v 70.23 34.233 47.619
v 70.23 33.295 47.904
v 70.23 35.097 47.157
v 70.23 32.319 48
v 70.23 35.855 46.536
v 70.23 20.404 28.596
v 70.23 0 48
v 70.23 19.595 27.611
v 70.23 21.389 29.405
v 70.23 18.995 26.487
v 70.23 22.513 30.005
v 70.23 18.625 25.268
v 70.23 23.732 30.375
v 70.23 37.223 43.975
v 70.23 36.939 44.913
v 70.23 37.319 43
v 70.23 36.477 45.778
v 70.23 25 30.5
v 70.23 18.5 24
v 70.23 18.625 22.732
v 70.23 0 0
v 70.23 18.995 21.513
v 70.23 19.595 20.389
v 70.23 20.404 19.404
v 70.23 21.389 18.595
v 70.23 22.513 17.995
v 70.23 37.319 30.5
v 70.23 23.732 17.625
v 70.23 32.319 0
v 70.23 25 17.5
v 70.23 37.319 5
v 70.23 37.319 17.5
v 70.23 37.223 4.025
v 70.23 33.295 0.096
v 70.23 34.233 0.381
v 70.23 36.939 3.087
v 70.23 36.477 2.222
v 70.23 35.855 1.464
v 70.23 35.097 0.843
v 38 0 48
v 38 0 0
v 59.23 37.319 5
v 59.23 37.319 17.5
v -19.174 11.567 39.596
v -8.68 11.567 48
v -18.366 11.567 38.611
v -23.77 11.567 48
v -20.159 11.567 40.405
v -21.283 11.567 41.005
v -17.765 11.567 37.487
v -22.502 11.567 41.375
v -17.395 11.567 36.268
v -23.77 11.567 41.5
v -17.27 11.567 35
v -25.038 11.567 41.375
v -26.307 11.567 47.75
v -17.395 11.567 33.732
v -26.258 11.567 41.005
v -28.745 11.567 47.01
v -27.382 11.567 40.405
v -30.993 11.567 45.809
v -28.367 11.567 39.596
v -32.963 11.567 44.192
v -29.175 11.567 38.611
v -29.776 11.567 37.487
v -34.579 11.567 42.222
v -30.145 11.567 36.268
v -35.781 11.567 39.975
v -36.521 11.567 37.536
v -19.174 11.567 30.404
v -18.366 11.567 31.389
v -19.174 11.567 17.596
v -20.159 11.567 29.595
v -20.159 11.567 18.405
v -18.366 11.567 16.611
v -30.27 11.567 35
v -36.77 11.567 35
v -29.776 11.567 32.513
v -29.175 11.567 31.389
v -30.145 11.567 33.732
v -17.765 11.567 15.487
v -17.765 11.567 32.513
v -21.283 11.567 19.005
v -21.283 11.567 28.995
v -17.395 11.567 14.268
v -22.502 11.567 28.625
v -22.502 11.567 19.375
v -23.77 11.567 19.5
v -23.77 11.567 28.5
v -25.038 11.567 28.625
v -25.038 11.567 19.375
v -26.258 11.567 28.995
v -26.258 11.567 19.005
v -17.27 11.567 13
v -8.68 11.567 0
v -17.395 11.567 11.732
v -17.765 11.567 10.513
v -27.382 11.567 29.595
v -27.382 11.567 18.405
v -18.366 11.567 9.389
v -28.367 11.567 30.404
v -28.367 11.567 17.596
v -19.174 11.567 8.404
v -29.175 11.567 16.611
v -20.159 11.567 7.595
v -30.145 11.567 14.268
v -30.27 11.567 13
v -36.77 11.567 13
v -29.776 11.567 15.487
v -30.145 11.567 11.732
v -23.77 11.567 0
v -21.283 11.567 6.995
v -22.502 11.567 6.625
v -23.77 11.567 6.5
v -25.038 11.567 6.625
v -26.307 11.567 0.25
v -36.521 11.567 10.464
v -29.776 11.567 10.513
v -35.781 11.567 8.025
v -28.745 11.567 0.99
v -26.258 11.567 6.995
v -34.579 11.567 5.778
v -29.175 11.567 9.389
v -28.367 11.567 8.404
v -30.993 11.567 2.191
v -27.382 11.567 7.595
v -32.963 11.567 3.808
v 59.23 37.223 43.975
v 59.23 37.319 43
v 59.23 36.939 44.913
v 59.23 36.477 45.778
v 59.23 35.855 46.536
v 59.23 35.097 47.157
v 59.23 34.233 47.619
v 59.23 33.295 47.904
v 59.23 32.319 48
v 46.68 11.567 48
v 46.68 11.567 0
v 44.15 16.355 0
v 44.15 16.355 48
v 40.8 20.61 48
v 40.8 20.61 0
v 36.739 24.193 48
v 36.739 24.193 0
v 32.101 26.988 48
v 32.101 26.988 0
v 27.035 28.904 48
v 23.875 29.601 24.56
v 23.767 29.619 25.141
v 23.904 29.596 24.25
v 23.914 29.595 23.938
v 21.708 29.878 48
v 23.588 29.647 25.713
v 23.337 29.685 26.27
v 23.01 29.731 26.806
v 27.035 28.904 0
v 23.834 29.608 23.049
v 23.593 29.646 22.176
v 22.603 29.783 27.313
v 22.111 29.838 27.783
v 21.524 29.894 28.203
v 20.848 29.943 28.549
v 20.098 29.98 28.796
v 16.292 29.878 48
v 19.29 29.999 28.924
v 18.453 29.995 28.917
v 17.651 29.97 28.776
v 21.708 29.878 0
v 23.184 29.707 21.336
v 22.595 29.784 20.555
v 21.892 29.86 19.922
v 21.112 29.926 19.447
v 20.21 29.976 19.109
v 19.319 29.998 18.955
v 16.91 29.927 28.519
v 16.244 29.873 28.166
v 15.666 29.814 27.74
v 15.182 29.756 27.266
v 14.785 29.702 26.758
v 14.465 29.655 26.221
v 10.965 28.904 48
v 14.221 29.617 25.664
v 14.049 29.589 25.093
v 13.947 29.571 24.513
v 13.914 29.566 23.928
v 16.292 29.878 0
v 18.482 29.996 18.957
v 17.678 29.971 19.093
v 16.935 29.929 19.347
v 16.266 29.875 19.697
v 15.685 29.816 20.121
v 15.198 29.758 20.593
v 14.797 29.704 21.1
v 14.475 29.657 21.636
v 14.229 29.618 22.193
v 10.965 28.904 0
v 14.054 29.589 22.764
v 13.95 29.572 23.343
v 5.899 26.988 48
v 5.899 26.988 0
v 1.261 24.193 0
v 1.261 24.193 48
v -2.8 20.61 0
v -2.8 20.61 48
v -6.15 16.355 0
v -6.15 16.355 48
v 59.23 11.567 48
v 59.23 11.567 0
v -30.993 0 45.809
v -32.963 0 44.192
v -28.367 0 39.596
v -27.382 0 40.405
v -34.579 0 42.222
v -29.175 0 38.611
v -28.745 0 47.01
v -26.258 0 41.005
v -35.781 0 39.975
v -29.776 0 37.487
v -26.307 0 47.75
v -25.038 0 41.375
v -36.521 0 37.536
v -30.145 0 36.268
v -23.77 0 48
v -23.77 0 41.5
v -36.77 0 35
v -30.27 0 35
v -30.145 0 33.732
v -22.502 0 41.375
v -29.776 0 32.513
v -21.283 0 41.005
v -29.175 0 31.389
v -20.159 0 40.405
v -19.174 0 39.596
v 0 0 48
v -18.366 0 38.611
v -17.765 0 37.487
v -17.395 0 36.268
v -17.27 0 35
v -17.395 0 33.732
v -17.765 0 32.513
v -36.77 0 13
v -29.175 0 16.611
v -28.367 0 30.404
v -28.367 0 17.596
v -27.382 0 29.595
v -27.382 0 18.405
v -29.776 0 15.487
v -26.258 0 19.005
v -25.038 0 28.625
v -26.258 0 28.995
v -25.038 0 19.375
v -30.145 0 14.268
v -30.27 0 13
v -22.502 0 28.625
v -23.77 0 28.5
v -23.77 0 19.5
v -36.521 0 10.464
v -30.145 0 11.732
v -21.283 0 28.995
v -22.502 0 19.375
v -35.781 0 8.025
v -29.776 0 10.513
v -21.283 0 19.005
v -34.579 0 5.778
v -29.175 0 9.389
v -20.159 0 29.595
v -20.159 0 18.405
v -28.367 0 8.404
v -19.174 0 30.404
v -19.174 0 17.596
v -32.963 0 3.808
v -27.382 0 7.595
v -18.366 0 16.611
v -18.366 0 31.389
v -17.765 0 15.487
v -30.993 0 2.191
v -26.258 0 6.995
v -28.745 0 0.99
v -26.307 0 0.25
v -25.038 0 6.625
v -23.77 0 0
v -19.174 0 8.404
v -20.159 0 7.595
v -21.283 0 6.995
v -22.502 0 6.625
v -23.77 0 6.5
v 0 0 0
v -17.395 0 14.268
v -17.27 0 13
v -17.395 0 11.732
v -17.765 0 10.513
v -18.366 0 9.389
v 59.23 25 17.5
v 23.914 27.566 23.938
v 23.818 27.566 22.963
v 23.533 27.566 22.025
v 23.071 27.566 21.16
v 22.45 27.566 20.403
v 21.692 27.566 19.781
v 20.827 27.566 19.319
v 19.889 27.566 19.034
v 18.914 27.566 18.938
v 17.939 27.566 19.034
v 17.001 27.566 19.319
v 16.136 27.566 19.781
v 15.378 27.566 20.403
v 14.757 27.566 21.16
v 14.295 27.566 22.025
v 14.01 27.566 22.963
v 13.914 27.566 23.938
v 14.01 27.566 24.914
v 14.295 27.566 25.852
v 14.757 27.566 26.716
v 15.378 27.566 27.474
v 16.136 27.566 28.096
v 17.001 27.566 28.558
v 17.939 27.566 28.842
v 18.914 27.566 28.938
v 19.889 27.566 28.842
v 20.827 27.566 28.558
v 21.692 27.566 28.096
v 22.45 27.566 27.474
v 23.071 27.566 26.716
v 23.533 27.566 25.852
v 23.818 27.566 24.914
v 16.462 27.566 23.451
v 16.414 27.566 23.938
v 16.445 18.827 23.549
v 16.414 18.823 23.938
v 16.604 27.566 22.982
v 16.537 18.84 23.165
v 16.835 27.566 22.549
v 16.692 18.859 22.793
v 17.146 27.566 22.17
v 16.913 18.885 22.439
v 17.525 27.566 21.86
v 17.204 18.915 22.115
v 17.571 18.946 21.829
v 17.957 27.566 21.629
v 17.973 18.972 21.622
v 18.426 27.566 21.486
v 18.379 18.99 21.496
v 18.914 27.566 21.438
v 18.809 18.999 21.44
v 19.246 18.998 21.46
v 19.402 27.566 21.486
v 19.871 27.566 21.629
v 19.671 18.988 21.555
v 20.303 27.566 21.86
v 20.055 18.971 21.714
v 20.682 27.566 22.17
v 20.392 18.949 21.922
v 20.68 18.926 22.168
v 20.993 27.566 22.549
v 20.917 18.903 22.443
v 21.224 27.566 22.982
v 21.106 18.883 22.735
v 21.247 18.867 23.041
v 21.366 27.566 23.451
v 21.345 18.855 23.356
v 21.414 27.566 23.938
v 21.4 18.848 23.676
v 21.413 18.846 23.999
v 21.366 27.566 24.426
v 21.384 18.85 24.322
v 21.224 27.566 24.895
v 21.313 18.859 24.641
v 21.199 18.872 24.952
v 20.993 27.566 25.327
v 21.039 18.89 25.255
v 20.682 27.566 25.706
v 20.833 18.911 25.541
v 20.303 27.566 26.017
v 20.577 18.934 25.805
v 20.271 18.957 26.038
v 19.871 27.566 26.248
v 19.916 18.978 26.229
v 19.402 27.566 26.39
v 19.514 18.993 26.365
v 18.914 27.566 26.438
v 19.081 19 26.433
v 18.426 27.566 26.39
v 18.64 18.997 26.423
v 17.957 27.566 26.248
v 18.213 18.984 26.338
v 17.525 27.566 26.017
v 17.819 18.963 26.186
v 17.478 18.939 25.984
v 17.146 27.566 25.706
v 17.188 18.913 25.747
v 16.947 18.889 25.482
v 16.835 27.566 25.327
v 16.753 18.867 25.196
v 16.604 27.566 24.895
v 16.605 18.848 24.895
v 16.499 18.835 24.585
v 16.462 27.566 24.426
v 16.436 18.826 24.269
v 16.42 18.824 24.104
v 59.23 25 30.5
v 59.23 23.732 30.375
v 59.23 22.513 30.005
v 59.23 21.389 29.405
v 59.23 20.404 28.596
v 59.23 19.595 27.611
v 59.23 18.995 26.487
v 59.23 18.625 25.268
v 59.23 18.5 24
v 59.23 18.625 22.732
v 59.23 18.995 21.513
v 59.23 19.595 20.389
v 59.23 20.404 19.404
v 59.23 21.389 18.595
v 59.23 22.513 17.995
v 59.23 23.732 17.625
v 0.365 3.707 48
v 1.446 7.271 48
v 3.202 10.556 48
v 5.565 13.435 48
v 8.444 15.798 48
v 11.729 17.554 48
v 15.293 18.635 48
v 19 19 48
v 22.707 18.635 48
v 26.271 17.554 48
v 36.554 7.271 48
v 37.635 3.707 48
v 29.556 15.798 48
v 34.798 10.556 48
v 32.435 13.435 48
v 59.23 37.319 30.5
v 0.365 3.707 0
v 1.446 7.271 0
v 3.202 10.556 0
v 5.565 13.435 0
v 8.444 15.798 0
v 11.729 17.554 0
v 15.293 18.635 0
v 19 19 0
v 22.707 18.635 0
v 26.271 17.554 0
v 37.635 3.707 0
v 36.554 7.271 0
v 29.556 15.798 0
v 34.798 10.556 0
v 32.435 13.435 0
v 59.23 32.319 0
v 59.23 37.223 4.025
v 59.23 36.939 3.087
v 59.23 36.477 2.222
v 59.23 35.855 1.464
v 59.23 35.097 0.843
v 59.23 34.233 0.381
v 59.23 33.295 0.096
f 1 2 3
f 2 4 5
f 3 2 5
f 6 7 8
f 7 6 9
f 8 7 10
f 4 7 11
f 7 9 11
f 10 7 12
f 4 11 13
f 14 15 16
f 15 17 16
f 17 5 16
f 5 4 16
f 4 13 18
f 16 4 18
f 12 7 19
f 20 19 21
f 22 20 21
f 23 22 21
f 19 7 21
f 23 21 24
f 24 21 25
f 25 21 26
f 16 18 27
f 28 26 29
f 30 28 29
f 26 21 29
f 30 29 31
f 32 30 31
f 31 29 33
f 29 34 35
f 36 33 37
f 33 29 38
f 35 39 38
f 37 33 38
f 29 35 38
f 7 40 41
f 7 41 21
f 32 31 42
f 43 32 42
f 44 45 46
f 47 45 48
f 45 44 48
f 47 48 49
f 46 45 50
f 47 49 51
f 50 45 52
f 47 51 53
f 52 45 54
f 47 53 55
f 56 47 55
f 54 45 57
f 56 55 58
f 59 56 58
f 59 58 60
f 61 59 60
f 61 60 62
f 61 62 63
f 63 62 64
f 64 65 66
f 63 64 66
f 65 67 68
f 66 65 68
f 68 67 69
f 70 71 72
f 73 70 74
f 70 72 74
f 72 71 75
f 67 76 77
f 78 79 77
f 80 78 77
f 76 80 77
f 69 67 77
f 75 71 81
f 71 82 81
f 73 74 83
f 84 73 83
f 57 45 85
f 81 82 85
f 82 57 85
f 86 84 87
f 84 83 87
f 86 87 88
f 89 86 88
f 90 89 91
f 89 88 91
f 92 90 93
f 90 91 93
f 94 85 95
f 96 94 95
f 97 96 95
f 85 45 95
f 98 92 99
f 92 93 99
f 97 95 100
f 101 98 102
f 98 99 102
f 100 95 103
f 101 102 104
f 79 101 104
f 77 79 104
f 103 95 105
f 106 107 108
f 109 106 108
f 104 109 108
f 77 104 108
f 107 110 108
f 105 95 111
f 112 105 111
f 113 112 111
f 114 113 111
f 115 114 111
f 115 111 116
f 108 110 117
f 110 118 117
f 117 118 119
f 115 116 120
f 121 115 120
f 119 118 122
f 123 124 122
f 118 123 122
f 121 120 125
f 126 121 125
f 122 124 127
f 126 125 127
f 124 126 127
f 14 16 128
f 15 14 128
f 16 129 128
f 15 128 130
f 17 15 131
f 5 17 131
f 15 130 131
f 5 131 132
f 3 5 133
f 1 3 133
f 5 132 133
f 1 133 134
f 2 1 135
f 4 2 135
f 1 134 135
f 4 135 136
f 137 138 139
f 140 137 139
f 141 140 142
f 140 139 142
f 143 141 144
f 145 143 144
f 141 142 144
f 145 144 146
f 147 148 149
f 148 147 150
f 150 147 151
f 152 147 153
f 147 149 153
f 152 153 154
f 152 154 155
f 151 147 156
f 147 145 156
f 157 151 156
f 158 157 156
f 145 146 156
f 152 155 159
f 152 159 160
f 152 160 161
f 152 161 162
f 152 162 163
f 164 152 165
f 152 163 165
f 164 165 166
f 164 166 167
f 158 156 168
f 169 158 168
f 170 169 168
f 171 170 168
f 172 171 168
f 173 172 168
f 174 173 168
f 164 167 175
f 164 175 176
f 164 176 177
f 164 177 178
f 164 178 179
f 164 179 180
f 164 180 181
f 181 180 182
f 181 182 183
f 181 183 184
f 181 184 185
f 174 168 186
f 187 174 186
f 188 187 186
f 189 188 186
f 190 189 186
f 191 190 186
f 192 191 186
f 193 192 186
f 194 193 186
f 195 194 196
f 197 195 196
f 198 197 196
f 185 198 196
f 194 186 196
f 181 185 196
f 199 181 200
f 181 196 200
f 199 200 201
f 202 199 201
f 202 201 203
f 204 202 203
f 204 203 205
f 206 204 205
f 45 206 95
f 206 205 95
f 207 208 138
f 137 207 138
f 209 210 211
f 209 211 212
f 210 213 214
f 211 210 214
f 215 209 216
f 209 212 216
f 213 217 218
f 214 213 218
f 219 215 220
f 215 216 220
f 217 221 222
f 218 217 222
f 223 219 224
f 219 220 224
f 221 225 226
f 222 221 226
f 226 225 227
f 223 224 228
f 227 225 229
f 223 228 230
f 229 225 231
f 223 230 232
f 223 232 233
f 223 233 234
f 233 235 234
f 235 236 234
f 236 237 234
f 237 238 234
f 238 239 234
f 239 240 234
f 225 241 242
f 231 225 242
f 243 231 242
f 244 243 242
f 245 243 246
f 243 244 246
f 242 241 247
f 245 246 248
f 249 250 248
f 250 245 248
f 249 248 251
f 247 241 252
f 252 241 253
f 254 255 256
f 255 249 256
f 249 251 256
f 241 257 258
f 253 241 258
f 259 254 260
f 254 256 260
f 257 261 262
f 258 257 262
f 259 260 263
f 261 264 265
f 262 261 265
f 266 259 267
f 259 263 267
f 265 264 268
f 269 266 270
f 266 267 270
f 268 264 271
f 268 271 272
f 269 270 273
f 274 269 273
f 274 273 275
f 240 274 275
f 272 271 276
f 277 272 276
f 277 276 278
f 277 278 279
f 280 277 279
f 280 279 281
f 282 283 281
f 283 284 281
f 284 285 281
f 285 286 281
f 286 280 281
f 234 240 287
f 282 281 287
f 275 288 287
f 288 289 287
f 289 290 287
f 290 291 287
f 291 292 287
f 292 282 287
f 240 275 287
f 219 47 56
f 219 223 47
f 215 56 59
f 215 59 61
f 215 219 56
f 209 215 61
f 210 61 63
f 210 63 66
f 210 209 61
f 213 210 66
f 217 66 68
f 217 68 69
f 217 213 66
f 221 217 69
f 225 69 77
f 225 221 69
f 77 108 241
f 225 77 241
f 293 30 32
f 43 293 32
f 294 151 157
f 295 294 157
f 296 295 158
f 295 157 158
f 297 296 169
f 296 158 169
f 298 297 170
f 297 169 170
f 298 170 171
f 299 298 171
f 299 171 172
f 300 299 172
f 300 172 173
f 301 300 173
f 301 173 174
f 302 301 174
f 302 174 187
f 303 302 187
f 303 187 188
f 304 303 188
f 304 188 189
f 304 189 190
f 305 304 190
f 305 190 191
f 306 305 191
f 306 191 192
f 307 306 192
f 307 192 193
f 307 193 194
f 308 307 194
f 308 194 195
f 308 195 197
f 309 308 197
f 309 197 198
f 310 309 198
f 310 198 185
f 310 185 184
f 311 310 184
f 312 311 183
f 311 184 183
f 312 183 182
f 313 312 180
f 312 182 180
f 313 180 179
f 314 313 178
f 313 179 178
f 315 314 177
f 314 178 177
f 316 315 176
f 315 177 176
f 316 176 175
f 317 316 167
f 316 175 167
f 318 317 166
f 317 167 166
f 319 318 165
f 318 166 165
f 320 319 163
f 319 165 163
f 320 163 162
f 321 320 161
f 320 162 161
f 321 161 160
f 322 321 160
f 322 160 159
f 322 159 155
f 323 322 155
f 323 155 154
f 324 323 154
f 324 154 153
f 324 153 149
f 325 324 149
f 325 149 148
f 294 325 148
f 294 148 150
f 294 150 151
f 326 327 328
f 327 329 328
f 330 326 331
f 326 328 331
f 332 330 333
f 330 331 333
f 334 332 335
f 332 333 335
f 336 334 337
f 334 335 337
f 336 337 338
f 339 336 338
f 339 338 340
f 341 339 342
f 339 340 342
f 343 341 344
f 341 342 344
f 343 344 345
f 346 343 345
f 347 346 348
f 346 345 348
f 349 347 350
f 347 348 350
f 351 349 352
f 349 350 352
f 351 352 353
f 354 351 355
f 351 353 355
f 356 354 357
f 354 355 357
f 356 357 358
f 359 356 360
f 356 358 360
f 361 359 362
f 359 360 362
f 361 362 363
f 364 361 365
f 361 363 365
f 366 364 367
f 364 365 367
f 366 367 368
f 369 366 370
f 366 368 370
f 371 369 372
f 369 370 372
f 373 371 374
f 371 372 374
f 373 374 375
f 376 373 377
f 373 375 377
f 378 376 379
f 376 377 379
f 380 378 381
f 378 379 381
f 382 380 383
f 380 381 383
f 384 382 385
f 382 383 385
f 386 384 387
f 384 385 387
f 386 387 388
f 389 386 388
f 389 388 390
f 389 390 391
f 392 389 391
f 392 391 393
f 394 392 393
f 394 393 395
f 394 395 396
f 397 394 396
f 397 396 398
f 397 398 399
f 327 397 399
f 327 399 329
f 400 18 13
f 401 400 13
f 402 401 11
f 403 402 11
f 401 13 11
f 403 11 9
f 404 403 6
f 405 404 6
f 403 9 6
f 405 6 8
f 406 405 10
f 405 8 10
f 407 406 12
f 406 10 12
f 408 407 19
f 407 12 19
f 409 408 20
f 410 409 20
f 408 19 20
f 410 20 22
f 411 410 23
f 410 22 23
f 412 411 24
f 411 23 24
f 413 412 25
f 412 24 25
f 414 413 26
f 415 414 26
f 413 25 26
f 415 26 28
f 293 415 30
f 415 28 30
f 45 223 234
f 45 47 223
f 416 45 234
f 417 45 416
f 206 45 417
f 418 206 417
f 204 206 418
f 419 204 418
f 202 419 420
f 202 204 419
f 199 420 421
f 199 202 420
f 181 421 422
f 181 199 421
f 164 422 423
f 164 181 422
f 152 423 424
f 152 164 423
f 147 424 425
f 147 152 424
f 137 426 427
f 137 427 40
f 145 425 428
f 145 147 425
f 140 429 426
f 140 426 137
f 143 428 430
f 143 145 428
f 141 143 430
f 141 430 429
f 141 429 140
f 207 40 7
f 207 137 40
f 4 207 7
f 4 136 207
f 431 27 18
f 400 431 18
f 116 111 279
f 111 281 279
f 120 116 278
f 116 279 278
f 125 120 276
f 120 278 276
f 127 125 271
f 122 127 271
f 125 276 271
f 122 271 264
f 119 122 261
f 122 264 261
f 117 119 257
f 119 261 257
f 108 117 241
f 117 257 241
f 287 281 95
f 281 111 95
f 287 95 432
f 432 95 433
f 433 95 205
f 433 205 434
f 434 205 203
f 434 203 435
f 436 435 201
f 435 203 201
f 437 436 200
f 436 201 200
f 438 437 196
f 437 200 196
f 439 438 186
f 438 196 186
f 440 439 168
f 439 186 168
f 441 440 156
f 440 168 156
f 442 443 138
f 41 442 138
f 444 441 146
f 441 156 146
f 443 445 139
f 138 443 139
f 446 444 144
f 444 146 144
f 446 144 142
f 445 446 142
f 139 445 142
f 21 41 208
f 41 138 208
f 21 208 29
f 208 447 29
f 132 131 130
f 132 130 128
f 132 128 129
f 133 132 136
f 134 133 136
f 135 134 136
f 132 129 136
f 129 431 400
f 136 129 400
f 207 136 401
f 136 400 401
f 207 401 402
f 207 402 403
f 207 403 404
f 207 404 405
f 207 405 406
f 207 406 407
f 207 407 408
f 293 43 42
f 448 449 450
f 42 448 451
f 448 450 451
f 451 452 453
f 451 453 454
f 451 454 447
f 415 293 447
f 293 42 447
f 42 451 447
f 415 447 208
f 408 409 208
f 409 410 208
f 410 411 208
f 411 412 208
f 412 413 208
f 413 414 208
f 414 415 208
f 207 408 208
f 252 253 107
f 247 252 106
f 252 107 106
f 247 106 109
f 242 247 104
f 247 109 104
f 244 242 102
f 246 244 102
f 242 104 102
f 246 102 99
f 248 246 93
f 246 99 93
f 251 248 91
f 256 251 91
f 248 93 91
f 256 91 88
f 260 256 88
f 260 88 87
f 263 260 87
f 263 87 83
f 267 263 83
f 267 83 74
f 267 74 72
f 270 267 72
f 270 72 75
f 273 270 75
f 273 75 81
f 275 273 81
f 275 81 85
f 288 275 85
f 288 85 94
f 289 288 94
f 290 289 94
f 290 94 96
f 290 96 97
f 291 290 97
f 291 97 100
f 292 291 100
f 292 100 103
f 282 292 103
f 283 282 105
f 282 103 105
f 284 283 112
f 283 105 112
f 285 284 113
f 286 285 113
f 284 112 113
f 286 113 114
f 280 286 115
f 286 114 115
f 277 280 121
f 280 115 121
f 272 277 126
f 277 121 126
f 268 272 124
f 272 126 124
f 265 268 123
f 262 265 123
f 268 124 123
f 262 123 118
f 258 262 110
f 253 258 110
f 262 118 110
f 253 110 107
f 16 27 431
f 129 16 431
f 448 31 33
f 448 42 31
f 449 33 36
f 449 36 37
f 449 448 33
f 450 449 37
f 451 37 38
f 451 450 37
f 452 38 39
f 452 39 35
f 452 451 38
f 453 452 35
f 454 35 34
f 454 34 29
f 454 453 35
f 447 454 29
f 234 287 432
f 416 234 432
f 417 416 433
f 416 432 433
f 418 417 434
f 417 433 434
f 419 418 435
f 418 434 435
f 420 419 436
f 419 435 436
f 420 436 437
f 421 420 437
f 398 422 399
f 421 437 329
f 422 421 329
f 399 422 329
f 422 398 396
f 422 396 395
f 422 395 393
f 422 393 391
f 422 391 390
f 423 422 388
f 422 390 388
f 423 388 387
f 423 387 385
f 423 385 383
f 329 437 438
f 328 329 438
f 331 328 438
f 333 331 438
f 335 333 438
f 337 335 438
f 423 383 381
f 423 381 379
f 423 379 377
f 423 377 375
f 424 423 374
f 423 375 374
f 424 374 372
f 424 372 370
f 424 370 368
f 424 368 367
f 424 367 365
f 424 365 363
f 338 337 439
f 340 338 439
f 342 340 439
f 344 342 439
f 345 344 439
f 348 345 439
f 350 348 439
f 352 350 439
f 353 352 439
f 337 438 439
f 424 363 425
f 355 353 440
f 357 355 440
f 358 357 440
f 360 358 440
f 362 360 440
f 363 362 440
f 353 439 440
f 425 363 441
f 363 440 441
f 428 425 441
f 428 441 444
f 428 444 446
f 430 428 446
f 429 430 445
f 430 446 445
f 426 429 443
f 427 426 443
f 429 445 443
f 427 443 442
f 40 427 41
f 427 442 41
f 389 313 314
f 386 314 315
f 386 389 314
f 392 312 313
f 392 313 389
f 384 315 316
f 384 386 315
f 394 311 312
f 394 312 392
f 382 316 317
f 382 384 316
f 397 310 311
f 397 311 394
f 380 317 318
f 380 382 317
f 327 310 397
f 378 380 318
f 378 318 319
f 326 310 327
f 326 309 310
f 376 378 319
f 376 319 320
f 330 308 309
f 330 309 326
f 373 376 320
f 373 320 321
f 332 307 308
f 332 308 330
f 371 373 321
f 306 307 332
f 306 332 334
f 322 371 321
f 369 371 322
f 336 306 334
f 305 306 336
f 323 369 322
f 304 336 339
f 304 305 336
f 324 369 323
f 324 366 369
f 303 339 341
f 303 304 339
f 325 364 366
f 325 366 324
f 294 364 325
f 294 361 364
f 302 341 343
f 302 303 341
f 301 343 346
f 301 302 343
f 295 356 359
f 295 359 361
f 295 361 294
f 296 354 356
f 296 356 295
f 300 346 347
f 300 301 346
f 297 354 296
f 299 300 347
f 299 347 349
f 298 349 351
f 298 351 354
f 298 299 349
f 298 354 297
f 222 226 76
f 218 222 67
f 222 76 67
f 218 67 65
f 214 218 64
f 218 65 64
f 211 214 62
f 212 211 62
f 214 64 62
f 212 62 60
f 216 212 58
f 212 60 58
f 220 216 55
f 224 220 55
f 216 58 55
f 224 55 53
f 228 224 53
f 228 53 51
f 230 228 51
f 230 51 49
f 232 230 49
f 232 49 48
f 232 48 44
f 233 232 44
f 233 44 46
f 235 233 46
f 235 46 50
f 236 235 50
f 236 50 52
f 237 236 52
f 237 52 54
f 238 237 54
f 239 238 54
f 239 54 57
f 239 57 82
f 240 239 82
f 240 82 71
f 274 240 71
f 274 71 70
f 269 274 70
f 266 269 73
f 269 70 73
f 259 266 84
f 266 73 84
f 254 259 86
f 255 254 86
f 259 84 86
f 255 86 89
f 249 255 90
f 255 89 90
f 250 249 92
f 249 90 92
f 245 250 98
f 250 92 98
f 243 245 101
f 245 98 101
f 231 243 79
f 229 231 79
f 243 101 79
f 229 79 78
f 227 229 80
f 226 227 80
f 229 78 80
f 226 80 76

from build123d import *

# Parameters (mm, degrees)
F1_DEPTH        = 48
F2_R            = 5
F4_DEPTH        = 11
F5_R            = 13
F6_R            = 6.5
F7_DEPTH        = 25
F10_D           = 5
F10_START       = 0.4342628
F10_CBORE_D     = 10
F10_CBORE_DEPTH = 2


with BuildPart() as f1:
    # F0 (on Top) → F1 (new body)
    with BuildSketch(Plane.XY):
        with BuildLine():
            Line((-8.6803510502, 11.5671157052), (-36.7703510502, 11.5671157052))
            Line((-36.7703510502, 11.5671157052), (-36.7703510502, 0))
            Line((-36.7703510502, 0), (0, 0))
            ThreePointArc((0, 0), (19, 19), (38, 0))
            Line((38, 0), (70.2296489498, 0))
            Line((70.2296489498, 0), (70.2296489498, 37.3193000675))
            Line((70.2296489498, 37.3193000675), (59.2296489498, 37.3193000675))
            Line((59.2296489498, 37.3193000675), (59.2296489498, 11.5671157052))
            Line((59.2296489498, 11.5671157052), (46.6803510502, 11.5671157052))
            ThreePointArc((46.6803510502, 11.5671157052), (19, 30), (-8.6803510502, 11.5671157052))
        make_face()
    extrude(amount=F1_DEPTH)

    # F2
    f2_edges = [f1.edges().sort_by_distance(p)[0] for p in [
        (64.729649, 37.3193, 48),
        (64.729649, 37.3193, 0),
    ]]
    fillet(f2_edges, radius=F2_R)

    # F3 (on face) → F4 (cut)
    with BuildSketch(Plane.YZ.offset(70.2296489498)):
        with BuildLine():
            Line((37.3193000675, 17.5), (37.3193000675, 30.5))
            Line((37.3193000675, 30.5), (25, 30.5))
            ThreePointArc((25, 30.5), (18.5, 24), (25, 17.5))
            Line((25, 17.5), (37.3193000675, 17.5))
        make_face()
    extrude(amount=-F4_DEPTH, mode=Mode.SUBTRACT)

    # F5
    f5_edges = [f1.edges().sort_by_distance(p)[0] for p in [
        (-36.770351, 5.783558, 48),
        (-36.770351, 5.783558, 0),
    ]]
    fillet(f5_edges, radius=F5_R)

    # F6 (on face) → F7 (cut)
    with BuildSketch(Plane(origin=(0, 11.5671157052, 0), x_dir=(-1, 0, 0), z_dir=(0, 1, 0))):
        with Locations((23.7703510502, 13)):
            Circle(F6_R)
        with Locations((23.7703510502, 35)):
            Circle(F6_R)
    extrude(amount=-F7_DEPTH, mode=Mode.SUBTRACT)

    # F10 (through all)
    # its depths count from where the whole tool has entered the part; down to there all is cleared
    with Locations(Plane(origin=(0, 30, 0), x_dir=(1, 0, 0), z_dir=(0, 1, 0)).offset(-F10_START)):
        with Locations((18.9140215516, -23.9382665604)):
            CounterBoreHole(F10_D / 2, F10_CBORE_D / 2, F10_CBORE_DEPTH)


solid = f1.part
